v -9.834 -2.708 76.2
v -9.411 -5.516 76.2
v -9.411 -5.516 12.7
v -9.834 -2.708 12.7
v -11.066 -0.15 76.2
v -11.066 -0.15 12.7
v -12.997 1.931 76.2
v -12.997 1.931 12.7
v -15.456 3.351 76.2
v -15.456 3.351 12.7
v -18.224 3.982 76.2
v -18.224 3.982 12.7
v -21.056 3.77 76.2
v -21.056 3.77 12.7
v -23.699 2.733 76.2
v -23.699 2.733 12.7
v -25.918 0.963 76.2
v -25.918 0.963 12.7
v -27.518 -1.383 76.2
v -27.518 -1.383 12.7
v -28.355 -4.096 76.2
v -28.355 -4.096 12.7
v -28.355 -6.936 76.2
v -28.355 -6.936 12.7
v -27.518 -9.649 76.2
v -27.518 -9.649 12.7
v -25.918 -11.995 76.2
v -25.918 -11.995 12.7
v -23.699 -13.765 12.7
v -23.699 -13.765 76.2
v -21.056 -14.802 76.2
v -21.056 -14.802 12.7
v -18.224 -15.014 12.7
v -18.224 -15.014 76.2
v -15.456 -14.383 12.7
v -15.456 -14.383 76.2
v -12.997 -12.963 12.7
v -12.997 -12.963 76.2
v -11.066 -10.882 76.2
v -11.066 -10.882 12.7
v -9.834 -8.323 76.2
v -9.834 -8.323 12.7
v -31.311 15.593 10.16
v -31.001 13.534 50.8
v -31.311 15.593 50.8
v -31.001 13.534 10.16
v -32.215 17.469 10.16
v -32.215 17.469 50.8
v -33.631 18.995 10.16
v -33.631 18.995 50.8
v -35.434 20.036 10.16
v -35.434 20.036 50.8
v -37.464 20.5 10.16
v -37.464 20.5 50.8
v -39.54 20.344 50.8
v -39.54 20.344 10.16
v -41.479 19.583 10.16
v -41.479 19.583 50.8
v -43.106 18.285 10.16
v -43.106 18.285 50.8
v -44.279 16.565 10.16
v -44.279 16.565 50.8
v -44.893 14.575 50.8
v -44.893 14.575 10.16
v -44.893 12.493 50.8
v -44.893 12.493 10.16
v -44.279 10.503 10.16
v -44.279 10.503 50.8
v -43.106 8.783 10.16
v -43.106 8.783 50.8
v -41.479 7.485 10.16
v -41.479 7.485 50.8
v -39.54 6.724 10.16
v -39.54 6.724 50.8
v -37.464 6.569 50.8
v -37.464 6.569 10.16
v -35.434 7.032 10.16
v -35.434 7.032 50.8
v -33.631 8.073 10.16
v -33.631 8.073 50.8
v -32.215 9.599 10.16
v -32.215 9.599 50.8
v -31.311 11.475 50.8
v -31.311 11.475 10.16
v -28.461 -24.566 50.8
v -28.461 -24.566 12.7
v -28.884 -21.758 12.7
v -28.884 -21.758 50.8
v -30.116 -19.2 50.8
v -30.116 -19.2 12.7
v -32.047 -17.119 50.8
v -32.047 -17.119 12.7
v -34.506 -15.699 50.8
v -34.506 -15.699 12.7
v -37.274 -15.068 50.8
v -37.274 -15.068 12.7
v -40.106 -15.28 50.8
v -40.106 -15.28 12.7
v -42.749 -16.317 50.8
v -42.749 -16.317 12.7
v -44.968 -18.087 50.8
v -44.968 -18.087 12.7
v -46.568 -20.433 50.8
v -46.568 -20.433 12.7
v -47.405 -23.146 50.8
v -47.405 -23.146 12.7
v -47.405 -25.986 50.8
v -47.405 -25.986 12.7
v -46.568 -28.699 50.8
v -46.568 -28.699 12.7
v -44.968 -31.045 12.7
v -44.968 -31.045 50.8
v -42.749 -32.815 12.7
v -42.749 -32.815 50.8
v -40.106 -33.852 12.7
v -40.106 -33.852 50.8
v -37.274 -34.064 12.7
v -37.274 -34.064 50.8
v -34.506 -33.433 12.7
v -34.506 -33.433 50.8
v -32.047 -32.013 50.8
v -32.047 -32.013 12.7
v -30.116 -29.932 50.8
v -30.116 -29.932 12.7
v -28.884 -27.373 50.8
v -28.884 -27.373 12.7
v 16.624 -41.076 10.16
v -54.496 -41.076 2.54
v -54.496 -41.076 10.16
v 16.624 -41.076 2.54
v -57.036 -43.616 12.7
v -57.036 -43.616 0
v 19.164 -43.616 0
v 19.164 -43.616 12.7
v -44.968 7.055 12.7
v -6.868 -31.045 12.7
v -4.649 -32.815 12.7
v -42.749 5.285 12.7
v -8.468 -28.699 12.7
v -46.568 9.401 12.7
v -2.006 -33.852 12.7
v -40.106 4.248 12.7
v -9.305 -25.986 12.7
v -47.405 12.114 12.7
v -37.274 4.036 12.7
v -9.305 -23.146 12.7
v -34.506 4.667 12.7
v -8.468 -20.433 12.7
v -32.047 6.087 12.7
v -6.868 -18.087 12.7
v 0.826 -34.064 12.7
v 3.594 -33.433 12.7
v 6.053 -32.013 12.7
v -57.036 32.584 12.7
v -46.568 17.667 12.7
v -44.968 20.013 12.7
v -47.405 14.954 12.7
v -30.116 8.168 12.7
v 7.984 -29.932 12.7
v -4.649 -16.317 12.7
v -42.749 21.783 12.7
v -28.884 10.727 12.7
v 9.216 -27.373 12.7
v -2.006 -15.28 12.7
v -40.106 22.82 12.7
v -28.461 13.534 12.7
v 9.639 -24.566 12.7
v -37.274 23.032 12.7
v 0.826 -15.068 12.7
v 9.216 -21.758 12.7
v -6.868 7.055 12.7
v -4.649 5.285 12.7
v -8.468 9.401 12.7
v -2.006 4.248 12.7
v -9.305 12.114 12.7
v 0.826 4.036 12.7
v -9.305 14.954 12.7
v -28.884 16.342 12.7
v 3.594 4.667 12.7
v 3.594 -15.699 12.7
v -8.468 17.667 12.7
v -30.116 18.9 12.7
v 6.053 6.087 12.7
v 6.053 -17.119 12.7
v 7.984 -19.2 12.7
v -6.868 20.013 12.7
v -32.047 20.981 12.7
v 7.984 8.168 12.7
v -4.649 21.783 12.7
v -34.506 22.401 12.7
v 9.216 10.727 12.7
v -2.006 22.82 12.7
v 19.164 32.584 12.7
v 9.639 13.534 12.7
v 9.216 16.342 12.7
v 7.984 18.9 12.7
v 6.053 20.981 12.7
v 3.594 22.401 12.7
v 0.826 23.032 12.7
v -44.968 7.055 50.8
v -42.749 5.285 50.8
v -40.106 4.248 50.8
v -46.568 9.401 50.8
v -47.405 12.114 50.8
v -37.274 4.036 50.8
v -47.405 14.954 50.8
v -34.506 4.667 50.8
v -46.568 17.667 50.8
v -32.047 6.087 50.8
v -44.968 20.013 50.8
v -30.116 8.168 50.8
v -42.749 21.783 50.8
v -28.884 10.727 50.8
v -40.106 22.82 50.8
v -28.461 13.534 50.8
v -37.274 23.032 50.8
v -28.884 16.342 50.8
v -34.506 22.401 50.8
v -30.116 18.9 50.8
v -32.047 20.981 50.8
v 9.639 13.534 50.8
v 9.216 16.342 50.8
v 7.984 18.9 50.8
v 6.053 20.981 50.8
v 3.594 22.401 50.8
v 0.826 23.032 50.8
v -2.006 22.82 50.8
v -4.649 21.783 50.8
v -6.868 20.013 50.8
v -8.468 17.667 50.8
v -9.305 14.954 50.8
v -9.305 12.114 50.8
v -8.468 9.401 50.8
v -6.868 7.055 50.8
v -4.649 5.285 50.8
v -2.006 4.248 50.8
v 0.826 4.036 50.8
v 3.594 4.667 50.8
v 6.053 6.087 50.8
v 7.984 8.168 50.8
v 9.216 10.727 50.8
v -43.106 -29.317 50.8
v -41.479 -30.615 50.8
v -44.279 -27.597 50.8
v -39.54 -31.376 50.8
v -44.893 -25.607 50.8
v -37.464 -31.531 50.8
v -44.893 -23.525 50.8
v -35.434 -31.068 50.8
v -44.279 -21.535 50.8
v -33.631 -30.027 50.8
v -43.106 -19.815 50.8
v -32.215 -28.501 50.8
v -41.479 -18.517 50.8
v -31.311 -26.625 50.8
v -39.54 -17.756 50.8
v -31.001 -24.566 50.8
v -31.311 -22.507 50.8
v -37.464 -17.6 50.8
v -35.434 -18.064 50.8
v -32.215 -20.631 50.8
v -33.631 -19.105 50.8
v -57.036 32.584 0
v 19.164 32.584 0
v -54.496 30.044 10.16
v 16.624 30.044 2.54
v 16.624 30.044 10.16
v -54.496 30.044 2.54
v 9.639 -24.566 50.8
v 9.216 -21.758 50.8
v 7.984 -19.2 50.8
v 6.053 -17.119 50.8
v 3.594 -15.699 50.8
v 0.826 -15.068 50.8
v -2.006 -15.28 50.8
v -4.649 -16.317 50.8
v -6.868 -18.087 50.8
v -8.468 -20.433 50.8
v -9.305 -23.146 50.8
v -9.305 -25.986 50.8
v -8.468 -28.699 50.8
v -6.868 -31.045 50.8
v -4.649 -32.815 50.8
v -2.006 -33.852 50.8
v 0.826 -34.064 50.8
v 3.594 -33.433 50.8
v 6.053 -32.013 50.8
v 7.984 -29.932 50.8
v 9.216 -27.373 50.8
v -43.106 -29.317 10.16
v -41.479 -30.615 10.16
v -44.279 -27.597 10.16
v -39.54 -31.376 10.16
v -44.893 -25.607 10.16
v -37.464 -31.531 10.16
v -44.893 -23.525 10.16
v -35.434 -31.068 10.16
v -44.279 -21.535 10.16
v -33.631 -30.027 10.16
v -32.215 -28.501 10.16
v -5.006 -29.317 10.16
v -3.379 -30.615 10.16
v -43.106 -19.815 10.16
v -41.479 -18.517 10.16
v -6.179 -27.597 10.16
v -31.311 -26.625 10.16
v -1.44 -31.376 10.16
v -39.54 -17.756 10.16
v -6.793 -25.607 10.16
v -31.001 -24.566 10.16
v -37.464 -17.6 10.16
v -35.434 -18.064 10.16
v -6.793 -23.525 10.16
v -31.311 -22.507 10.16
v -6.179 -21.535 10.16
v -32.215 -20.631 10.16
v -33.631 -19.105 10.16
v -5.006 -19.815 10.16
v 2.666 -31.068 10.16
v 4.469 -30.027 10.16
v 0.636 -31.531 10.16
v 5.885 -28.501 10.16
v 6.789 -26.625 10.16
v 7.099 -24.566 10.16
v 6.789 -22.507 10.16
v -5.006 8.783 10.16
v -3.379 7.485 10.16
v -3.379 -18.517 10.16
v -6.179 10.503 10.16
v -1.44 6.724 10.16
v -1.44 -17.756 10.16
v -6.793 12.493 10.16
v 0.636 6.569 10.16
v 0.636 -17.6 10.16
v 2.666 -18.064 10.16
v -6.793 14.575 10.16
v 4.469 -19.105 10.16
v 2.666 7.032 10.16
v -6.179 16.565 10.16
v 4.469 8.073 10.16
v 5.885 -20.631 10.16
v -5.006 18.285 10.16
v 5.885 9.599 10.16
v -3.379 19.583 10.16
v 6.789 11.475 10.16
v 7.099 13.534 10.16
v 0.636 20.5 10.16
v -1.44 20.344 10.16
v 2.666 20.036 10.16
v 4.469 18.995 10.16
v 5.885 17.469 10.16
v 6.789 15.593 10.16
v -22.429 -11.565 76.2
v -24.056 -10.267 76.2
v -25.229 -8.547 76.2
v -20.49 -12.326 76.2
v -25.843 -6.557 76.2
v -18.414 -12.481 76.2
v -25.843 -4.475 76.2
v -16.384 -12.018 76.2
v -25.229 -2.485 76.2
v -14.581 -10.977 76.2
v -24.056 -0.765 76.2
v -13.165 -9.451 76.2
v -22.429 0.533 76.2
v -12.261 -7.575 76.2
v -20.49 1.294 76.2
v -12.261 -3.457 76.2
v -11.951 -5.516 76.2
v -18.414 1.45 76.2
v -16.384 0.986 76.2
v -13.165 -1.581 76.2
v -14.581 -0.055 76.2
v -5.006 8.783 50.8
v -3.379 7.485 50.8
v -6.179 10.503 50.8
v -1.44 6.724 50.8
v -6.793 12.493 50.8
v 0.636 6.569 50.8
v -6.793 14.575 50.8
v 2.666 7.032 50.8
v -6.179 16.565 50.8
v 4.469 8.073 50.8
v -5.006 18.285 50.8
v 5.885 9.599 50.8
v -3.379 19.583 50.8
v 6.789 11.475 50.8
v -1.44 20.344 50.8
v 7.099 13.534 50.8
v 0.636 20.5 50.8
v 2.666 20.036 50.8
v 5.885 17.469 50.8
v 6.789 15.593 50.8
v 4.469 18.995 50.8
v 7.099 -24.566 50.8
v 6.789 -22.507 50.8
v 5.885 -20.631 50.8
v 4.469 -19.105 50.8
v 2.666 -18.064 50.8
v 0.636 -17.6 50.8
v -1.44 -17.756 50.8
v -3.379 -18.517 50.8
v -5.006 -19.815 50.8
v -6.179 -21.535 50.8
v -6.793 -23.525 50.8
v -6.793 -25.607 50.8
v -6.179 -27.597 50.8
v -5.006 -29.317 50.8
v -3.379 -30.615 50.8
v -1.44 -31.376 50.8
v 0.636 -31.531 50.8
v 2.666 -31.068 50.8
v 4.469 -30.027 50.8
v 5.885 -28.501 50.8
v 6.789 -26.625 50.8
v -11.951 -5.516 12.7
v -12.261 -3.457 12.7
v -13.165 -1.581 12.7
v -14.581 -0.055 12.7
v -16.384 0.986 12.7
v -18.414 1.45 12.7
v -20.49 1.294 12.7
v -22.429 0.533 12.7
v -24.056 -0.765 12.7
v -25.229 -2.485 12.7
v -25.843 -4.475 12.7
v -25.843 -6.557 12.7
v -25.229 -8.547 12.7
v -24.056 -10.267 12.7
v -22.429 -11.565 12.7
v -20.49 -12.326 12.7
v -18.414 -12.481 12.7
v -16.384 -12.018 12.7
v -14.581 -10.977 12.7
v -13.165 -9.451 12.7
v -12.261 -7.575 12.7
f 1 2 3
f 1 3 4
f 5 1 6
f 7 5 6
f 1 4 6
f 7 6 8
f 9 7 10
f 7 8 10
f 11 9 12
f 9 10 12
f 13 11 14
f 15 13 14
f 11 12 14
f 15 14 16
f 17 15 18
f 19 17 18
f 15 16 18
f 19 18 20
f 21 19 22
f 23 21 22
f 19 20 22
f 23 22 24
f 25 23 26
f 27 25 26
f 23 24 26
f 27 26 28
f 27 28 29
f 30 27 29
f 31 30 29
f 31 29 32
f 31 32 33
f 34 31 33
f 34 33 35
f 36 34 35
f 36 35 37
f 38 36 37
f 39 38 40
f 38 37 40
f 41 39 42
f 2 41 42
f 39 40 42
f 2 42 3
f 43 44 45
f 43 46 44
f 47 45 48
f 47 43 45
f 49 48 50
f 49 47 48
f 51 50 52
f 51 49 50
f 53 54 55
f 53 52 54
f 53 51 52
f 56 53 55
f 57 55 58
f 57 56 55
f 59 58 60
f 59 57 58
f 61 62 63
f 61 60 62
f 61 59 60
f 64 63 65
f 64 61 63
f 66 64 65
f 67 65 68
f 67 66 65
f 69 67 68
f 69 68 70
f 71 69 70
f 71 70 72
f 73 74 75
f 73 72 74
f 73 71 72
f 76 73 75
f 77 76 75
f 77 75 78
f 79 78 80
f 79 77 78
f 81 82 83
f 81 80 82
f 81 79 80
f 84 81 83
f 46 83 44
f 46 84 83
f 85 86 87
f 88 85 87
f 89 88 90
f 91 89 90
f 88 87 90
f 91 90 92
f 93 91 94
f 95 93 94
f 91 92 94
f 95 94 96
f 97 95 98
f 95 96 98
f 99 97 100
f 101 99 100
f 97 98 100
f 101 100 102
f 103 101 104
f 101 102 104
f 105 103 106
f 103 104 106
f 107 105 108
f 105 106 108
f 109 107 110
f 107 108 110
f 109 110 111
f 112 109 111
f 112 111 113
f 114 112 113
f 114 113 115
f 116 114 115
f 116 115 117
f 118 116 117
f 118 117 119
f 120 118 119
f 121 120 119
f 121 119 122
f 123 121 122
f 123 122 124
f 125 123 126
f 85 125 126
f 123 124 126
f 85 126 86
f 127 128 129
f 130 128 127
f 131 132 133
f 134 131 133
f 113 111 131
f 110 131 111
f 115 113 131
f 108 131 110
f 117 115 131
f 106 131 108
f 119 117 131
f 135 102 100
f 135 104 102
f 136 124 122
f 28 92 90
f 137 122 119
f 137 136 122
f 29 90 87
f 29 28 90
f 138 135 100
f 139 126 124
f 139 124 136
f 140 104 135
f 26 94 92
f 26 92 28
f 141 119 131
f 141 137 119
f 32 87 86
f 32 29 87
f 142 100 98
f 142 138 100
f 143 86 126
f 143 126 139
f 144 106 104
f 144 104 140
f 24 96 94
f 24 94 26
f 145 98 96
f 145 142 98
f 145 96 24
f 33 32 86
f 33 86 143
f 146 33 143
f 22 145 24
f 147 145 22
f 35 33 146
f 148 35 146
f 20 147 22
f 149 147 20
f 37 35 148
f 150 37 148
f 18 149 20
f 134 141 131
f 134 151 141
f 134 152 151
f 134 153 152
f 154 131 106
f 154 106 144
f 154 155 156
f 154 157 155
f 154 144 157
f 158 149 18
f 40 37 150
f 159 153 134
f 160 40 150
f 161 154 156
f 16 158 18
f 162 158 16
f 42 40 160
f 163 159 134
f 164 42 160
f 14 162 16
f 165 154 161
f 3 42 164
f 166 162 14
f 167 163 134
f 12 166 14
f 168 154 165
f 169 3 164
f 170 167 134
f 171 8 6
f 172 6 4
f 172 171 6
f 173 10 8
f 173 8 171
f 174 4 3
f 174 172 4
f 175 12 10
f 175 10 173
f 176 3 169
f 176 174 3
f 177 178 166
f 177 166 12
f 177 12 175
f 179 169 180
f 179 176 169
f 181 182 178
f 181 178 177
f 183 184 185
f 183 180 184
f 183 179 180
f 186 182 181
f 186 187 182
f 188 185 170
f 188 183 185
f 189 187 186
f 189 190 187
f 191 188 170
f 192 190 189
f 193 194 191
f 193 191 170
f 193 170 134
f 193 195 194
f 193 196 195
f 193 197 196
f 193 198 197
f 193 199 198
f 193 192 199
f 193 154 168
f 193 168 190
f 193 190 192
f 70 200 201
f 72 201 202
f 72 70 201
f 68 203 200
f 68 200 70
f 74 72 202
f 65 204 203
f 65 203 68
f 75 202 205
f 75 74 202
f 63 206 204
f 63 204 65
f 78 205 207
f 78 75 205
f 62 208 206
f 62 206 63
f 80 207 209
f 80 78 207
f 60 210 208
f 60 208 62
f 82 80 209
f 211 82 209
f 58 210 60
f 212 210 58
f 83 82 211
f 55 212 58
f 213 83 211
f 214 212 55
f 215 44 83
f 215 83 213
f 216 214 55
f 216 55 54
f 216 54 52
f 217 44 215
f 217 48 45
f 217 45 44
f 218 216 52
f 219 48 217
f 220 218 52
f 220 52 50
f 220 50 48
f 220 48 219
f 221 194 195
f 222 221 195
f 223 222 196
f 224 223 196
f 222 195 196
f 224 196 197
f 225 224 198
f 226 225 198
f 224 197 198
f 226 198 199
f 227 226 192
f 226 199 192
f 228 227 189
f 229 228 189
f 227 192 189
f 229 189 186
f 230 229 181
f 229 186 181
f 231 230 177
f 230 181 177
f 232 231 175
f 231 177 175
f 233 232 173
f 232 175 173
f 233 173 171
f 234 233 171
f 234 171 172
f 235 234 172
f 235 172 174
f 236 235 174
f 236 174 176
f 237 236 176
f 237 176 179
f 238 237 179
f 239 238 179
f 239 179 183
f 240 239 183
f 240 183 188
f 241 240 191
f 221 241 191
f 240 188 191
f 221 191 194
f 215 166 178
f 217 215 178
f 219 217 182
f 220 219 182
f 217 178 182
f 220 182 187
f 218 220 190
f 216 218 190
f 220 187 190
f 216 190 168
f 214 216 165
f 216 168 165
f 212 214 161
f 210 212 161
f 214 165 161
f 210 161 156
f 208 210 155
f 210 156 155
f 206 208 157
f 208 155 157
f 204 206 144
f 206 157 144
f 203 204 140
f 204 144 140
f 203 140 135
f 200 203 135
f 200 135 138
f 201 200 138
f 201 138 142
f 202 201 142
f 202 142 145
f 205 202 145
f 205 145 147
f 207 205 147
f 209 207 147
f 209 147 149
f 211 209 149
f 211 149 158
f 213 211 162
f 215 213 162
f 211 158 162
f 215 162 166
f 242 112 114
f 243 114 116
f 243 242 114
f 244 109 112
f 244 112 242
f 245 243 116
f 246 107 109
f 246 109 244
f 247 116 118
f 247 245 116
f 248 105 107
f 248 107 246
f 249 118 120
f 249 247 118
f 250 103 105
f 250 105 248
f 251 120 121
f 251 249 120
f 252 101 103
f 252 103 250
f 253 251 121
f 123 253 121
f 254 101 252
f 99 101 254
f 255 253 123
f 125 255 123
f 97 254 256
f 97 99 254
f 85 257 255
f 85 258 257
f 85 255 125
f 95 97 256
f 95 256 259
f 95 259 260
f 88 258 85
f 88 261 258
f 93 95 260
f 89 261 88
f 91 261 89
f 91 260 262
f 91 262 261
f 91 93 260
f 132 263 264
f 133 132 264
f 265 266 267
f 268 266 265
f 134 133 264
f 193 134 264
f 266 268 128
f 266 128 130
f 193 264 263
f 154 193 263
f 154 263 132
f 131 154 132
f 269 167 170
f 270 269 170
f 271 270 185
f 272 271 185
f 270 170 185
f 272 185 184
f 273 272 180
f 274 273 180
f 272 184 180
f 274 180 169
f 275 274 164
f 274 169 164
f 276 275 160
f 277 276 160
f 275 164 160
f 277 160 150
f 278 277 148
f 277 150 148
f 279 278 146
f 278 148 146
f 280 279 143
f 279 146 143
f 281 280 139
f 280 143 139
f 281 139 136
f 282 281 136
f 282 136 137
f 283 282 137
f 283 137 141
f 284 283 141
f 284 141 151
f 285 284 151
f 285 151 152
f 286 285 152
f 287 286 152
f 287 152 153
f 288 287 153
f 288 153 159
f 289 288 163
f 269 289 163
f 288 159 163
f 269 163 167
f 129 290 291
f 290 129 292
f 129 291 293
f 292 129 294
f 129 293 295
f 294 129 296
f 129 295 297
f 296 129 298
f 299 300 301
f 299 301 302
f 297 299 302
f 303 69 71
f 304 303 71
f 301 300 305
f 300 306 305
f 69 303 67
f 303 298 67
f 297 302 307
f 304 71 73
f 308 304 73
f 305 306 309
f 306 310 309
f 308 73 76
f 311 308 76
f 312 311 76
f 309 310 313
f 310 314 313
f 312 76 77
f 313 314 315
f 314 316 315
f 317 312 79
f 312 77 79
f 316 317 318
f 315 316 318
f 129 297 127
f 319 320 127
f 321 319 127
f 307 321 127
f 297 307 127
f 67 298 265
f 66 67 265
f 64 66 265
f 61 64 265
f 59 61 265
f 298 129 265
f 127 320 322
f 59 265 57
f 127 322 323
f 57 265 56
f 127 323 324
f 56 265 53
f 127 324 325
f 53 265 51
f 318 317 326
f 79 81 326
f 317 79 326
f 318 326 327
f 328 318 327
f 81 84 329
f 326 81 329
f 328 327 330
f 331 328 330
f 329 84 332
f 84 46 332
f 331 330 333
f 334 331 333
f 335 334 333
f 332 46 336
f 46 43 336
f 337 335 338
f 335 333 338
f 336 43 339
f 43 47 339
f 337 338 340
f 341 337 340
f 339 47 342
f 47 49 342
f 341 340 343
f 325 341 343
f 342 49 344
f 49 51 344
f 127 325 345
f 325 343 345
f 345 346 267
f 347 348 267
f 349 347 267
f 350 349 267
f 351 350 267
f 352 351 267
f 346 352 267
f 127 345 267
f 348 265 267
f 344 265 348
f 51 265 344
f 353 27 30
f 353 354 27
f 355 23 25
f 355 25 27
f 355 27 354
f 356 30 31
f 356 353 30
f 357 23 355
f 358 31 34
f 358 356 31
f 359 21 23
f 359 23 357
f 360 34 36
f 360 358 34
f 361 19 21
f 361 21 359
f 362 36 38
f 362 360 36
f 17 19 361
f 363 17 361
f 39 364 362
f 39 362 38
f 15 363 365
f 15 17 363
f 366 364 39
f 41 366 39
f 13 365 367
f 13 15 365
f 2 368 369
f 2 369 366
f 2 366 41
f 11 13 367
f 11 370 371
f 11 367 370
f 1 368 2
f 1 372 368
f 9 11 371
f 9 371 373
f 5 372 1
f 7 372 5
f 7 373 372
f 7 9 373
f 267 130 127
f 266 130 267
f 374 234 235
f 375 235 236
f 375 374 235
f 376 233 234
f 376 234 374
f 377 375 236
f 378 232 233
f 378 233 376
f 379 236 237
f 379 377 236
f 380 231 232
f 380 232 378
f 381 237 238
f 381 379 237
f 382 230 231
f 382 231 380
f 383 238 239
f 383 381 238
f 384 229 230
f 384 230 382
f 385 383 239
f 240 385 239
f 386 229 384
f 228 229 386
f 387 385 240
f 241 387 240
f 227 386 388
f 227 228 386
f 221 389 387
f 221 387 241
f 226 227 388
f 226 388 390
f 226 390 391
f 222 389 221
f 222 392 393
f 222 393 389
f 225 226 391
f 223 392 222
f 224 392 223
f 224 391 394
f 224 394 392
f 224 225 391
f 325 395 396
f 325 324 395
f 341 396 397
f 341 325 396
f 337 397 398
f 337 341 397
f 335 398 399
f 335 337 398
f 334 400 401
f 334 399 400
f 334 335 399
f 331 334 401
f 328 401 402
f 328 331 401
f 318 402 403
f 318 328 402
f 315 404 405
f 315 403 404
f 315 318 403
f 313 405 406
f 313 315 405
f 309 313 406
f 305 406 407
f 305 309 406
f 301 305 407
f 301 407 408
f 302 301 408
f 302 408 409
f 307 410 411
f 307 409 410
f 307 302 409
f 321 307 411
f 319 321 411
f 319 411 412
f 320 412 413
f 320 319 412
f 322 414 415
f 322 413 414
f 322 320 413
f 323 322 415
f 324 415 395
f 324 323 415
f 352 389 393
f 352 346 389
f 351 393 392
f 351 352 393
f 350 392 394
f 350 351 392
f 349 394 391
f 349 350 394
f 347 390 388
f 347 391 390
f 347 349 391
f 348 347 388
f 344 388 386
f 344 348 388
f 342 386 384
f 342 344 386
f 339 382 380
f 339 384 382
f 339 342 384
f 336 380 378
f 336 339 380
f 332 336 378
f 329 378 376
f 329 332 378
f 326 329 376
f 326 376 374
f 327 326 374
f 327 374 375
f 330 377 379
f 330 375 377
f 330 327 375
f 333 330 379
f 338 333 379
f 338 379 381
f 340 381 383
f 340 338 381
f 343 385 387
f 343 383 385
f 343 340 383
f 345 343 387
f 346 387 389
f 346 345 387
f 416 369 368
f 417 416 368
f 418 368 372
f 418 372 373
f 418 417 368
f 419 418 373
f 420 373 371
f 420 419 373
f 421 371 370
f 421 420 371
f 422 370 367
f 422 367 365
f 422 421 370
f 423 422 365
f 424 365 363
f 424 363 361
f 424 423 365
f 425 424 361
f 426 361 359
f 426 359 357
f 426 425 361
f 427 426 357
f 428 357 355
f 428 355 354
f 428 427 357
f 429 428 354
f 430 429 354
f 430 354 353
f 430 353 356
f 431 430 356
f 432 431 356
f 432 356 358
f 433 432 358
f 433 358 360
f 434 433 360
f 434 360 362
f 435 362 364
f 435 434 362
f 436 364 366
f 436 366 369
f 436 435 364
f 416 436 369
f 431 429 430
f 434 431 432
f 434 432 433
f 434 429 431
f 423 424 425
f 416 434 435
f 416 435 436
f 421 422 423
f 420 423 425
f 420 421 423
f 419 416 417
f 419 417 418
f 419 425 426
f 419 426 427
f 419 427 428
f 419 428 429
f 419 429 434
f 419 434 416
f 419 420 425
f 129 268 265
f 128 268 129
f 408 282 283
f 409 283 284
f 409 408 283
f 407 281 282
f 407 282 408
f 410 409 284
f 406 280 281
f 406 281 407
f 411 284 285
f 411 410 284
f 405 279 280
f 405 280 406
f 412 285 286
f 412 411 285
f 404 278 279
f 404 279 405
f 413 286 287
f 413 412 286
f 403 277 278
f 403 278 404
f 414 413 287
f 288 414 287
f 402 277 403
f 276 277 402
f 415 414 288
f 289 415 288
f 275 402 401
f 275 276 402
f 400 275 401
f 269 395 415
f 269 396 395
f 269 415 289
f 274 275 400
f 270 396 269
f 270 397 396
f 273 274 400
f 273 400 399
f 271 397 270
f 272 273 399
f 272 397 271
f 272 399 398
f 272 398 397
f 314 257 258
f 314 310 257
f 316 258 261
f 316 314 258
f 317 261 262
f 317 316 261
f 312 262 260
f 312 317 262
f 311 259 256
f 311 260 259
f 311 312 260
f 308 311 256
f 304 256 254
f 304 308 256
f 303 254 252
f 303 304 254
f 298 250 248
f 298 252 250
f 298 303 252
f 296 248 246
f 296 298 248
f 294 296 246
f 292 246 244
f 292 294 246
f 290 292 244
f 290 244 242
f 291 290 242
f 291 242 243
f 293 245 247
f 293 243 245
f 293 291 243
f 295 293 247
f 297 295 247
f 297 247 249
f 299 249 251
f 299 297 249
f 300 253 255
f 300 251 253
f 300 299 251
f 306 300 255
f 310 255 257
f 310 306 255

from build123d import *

# Parameters (mm, degrees)
F1_DEPTH    = 12.7
F2_R        = 9.525
F3_DEPTH    = 38.1
F4_T        = -2.54
F5_R        = 9.525
F6_DEPTH    = 63.5
F7_T        = 2.54
F7_T3_DEPTH = 12.7
F7_T5_DEPTH = 76.2
F7_T7_DEPTH = 76.2


# Not quite as in the source:
# - a shell that OpenCascade refuses in one call is made with other operations: the cavity is built on its own and cut out


with BuildPart() as f1:
    # F0 (on Top) → F1 (new body)
    with BuildSketch(Plane.XY):
        Polygon((-18.9360706136, 32.5840498031), (-57.0360706136, 32.5840498031), (-57.0360706136, -5.5159501969), (-57.0360706136, -43.6159501969), (-18.9360706136, -43.6159501969), (19.1639293864, -43.6159501969), (19.1639293864, -5.5159501969), (19.1639293864, 32.5840498031), align=None)
    extrude(amount=F1_DEPTH)

    # F2 (on face) → F3 (join)
    with BuildSketch(Plane.XY.offset(12.7)):
        with Locations((-37.9860706136, 13.5340498031)):
            Circle(F2_R)
        with Locations((0.1139293864, 13.5340498031)):
            Circle(F2_R)
        with Locations((-37.9860706136, -24.5659501969)):
            Circle(F2_R)
        with Locations((0.1139293864, -24.5659501969)):
            Circle(F2_R)
    extrude(amount=F3_DEPTH)

    # F4
    f4_openings = [f1.faces().sort_by_distance(p)[0] for p in [
        (0.113929, 13.53405, 50.8),
        (0.113929, -24.56595, 50.8),
        (-37.986071, -24.56595, 50.8),
        (-37.986071, 13.53405, 50.8),
    ]]
    offset(amount=F4_T, openings=f4_openings, kind=Kind.INTERSECTION)

    # F5 (on face) → F6 (join)
    with BuildSketch(Plane.XY.offset(12.7)):
        with Locations((-18.9360706136, -5.5159501969)):
            Circle(F5_R)
    extrude(amount=F6_DEPTH)

    # F7: shell of thickness 2.54, made by hand


with BuildPart() as f7_core1:
    # F7_t2: copy of F1
    add(f1.part)

    # the walls: a layer under each face that stays
    f7_faces = [f7_core1.faces().sort_by_distance(p)[0] for p in [
        (-18.9360706136, 30.0440498031, 6.35),
        (16.6239293864, -5.5159501969, 6.35),
        (-18.9360706136, -5.5159501969, 10.16),
        (-54.4960706136, -5.5159501969, 6.35),
        (-18.9360706136, -5.5159501969, 2.54),
        (-18.9360706136, -41.0759501969, 6.35),
        (-44.9710706136, 13.5340498031, 30.48),
        (-44.9710706136, -24.5659501969, 30.48),
        (-6.8710706136, 13.5340498031, 30.48),
        (-6.8710706136, -24.5659501969, 30.48),
        (-44.3360706136, 7.1840498031, 50.8),
        (-44.3360706136, -30.9159501969, 50.8),
        (-6.2360706136, 7.1840498031, 50.8),
        (-6.2360706136, -30.9159501969, 50.8),
        (-47.5110706136, 13.5340498031, 31.75),
        (-47.5110706136, -24.5659501969, 31.75),
        (-9.4110706136, 13.5340498031, 31.75),
        (-9.4110706136, -24.5659501969, 31.75),
        (-44.3360706136, -5.5159501969, 12.7),
        (-18.9360706136, 32.5840498031, 6.35),
        (-57.0360706136, -5.5159501969, 6.35),
        (19.1639293864, -5.5159501969, 6.35),
        (-18.9360706136, -43.6159501969, 6.35),
        (-28.4610706136, -5.5159501969, 44.45),
        (-18.9360706136, -5.5159501969, 0),
    ]]
    thicken(f7_faces, amount=-F7_T, mode=Mode.SUBTRACT)

    # F7_s4 → F7_t3 (cut)
    with BuildSketch(Plane.XY):
        Polygon((16.5985293864, 30.0186498031), (16.6239293864, 32.5840498031), (19.1639293864, 32.5840498031), (19.1639293864, 30.0440498031), align=None)
        Polygon((-54.4706706136, 30.0186498031), (-54.4960706136, 32.5840498031), (-57.0360706136, 32.5840498031), (-57.0360706136, 30.0440498031), align=None)
        Polygon((16.5985293864, -41.0505501969), (19.1639293864, -41.0759501969), (19.1639293864, -43.6159501969), (16.6239293864, -43.6159501969), align=None)
        Polygon((-54.4706706136, -41.0505501969), (-57.0360706136, -41.0759501969), (-57.0360706136, -43.6159501969), (-54.4960706136, -43.6159501969), align=None)
    extrude(amount=F7_T3_DEPTH, mode=Mode.SUBTRACT)

    # F7_s6 → F7_t5 (cut)
    with BuildSketch(Plane.YZ.offset(-57.0360706136)):
        Polygon((30.0186498031, 10.1346), (32.5840498031, 10.16), (32.5840498031, 12.7), (30.0440498031, 12.7), align=None)
        Polygon((30.0186498031, 2.5654), (32.5840498031, 2.54), (32.5840498031, 0), (30.0440498031, 0), align=None)
        Polygon((-41.0505501969, 10.1346), (-41.0759501969, 12.7), (-43.6159501969, 12.7), (-43.6159501969, 10.16), align=None)
        Polygon((-41.0505501969, 2.5654), (-41.0759501969, 0), (-43.6159501969, 0), (-43.6159501969, 2.54), align=None)
    extrude(amount=F7_T5_DEPTH, mode=Mode.SUBTRACT)

    # F7_s8 → F7_t7 (cut)
    with BuildSketch(Plane.XZ.offset(-32.5840498031)):
        Polygon((16.5985293864, 10.1346), (19.1639293864, 10.16), (19.1639293864, 12.7), (16.6239293864, 12.7), align=None)
        Polygon((16.5985293864, 2.5654), (19.1639293864, 2.54), (19.1639293864, 0), (16.6239293864, 0), align=None)
        Polygon((-54.4706706136, 10.1346), (-54.4960706136, 12.7), (-57.0360706136, 12.7), (-57.0360706136, 10.16), align=None)
        Polygon((-54.4706706136, 2.5654), (-57.0360706136, 2.54), (-57.0360706136, 0), (-54.4960706136, 0), align=None)
    extrude(amount=F7_T7_DEPTH, mode=Mode.SUBTRACT)

    # F7_s9 → F7_t10 (revolve, cut)
    with BuildSketch(Plane.XZ.offset(-13.5340498031)):
        Polygon((-28.4356706136, 12.7254), (-31.0010706136, 12.7), (-31.0010706136, 10.16), (-28.4610706136, 10.16), align=None)
    revolve(axis=Axis((-37.9860706136, 13.5340498031, 12.7), (0, 0, 1)), mode=Mode.SUBTRACT)

    # F7_s11 → F7_t12 (revolve, cut)
    with BuildSketch(Plane.XZ.offset(24.5659501969)):
        Polygon((-28.4356706136, 12.7254), (-31.0010706136, 12.7), (-31.0010706136, 10.16), (-28.4610706136, 10.16), align=None)
    revolve(axis=Axis((-37.9860706136, -24.5659501969, 12.7), (0, 0, 1)), mode=Mode.SUBTRACT)

    # F7_s13 → F7_t14 (revolve, cut)
    with BuildSketch(Plane.XZ.offset(-13.5340498031)):
        Polygon((9.6643293864, 12.7254), (7.0989293864, 12.7), (7.0989293864, 10.16), (9.6389293864, 10.16), align=None)
    revolve(axis=Axis((0.1139293864, 13.5340498031, 12.7), (0, 0, 1)), mode=Mode.SUBTRACT)

    # F7_s15 → F7_t16 (revolve, cut)
    with BuildSketch(Plane.XZ.offset(24.5659501969)):
        Polygon((9.6643293864, 12.7254), (7.0989293864, 12.7), (7.0989293864, 10.16), (9.6389293864, 10.16), align=None)
    revolve(axis=Axis((0.1139293864, -24.5659501969, 12.7), (0, 0, 1)), mode=Mode.SUBTRACT)

    # F7_s17 → F7_t18 (revolve, cut)
    with BuildSketch(Plane.XZ.offset(5.5159501969)):
        Polygon((-9.3856706136, 12.7254), (-9.4110706136, 10.16), (-11.9510706136, 10.16), (-11.9510706136, 12.7), align=None)
    revolve(axis=Axis((-18.9360706136, -5.5159501969, 12.7), (0, 0, 1)), mode=Mode.SUBTRACT)


with BuildPart() as f1_1:
    add(f1.part)

    # what is left inside the walls is the cavity
    f7_cavity = [f7_core1.part.solids().sort_by_distance(p)[0] for p in [
        (-25.895671, -5.51595, 55.033333),
    ]]
    add(f7_cavity, mode=Mode.SUBTRACT)


solid = f1_1.part
